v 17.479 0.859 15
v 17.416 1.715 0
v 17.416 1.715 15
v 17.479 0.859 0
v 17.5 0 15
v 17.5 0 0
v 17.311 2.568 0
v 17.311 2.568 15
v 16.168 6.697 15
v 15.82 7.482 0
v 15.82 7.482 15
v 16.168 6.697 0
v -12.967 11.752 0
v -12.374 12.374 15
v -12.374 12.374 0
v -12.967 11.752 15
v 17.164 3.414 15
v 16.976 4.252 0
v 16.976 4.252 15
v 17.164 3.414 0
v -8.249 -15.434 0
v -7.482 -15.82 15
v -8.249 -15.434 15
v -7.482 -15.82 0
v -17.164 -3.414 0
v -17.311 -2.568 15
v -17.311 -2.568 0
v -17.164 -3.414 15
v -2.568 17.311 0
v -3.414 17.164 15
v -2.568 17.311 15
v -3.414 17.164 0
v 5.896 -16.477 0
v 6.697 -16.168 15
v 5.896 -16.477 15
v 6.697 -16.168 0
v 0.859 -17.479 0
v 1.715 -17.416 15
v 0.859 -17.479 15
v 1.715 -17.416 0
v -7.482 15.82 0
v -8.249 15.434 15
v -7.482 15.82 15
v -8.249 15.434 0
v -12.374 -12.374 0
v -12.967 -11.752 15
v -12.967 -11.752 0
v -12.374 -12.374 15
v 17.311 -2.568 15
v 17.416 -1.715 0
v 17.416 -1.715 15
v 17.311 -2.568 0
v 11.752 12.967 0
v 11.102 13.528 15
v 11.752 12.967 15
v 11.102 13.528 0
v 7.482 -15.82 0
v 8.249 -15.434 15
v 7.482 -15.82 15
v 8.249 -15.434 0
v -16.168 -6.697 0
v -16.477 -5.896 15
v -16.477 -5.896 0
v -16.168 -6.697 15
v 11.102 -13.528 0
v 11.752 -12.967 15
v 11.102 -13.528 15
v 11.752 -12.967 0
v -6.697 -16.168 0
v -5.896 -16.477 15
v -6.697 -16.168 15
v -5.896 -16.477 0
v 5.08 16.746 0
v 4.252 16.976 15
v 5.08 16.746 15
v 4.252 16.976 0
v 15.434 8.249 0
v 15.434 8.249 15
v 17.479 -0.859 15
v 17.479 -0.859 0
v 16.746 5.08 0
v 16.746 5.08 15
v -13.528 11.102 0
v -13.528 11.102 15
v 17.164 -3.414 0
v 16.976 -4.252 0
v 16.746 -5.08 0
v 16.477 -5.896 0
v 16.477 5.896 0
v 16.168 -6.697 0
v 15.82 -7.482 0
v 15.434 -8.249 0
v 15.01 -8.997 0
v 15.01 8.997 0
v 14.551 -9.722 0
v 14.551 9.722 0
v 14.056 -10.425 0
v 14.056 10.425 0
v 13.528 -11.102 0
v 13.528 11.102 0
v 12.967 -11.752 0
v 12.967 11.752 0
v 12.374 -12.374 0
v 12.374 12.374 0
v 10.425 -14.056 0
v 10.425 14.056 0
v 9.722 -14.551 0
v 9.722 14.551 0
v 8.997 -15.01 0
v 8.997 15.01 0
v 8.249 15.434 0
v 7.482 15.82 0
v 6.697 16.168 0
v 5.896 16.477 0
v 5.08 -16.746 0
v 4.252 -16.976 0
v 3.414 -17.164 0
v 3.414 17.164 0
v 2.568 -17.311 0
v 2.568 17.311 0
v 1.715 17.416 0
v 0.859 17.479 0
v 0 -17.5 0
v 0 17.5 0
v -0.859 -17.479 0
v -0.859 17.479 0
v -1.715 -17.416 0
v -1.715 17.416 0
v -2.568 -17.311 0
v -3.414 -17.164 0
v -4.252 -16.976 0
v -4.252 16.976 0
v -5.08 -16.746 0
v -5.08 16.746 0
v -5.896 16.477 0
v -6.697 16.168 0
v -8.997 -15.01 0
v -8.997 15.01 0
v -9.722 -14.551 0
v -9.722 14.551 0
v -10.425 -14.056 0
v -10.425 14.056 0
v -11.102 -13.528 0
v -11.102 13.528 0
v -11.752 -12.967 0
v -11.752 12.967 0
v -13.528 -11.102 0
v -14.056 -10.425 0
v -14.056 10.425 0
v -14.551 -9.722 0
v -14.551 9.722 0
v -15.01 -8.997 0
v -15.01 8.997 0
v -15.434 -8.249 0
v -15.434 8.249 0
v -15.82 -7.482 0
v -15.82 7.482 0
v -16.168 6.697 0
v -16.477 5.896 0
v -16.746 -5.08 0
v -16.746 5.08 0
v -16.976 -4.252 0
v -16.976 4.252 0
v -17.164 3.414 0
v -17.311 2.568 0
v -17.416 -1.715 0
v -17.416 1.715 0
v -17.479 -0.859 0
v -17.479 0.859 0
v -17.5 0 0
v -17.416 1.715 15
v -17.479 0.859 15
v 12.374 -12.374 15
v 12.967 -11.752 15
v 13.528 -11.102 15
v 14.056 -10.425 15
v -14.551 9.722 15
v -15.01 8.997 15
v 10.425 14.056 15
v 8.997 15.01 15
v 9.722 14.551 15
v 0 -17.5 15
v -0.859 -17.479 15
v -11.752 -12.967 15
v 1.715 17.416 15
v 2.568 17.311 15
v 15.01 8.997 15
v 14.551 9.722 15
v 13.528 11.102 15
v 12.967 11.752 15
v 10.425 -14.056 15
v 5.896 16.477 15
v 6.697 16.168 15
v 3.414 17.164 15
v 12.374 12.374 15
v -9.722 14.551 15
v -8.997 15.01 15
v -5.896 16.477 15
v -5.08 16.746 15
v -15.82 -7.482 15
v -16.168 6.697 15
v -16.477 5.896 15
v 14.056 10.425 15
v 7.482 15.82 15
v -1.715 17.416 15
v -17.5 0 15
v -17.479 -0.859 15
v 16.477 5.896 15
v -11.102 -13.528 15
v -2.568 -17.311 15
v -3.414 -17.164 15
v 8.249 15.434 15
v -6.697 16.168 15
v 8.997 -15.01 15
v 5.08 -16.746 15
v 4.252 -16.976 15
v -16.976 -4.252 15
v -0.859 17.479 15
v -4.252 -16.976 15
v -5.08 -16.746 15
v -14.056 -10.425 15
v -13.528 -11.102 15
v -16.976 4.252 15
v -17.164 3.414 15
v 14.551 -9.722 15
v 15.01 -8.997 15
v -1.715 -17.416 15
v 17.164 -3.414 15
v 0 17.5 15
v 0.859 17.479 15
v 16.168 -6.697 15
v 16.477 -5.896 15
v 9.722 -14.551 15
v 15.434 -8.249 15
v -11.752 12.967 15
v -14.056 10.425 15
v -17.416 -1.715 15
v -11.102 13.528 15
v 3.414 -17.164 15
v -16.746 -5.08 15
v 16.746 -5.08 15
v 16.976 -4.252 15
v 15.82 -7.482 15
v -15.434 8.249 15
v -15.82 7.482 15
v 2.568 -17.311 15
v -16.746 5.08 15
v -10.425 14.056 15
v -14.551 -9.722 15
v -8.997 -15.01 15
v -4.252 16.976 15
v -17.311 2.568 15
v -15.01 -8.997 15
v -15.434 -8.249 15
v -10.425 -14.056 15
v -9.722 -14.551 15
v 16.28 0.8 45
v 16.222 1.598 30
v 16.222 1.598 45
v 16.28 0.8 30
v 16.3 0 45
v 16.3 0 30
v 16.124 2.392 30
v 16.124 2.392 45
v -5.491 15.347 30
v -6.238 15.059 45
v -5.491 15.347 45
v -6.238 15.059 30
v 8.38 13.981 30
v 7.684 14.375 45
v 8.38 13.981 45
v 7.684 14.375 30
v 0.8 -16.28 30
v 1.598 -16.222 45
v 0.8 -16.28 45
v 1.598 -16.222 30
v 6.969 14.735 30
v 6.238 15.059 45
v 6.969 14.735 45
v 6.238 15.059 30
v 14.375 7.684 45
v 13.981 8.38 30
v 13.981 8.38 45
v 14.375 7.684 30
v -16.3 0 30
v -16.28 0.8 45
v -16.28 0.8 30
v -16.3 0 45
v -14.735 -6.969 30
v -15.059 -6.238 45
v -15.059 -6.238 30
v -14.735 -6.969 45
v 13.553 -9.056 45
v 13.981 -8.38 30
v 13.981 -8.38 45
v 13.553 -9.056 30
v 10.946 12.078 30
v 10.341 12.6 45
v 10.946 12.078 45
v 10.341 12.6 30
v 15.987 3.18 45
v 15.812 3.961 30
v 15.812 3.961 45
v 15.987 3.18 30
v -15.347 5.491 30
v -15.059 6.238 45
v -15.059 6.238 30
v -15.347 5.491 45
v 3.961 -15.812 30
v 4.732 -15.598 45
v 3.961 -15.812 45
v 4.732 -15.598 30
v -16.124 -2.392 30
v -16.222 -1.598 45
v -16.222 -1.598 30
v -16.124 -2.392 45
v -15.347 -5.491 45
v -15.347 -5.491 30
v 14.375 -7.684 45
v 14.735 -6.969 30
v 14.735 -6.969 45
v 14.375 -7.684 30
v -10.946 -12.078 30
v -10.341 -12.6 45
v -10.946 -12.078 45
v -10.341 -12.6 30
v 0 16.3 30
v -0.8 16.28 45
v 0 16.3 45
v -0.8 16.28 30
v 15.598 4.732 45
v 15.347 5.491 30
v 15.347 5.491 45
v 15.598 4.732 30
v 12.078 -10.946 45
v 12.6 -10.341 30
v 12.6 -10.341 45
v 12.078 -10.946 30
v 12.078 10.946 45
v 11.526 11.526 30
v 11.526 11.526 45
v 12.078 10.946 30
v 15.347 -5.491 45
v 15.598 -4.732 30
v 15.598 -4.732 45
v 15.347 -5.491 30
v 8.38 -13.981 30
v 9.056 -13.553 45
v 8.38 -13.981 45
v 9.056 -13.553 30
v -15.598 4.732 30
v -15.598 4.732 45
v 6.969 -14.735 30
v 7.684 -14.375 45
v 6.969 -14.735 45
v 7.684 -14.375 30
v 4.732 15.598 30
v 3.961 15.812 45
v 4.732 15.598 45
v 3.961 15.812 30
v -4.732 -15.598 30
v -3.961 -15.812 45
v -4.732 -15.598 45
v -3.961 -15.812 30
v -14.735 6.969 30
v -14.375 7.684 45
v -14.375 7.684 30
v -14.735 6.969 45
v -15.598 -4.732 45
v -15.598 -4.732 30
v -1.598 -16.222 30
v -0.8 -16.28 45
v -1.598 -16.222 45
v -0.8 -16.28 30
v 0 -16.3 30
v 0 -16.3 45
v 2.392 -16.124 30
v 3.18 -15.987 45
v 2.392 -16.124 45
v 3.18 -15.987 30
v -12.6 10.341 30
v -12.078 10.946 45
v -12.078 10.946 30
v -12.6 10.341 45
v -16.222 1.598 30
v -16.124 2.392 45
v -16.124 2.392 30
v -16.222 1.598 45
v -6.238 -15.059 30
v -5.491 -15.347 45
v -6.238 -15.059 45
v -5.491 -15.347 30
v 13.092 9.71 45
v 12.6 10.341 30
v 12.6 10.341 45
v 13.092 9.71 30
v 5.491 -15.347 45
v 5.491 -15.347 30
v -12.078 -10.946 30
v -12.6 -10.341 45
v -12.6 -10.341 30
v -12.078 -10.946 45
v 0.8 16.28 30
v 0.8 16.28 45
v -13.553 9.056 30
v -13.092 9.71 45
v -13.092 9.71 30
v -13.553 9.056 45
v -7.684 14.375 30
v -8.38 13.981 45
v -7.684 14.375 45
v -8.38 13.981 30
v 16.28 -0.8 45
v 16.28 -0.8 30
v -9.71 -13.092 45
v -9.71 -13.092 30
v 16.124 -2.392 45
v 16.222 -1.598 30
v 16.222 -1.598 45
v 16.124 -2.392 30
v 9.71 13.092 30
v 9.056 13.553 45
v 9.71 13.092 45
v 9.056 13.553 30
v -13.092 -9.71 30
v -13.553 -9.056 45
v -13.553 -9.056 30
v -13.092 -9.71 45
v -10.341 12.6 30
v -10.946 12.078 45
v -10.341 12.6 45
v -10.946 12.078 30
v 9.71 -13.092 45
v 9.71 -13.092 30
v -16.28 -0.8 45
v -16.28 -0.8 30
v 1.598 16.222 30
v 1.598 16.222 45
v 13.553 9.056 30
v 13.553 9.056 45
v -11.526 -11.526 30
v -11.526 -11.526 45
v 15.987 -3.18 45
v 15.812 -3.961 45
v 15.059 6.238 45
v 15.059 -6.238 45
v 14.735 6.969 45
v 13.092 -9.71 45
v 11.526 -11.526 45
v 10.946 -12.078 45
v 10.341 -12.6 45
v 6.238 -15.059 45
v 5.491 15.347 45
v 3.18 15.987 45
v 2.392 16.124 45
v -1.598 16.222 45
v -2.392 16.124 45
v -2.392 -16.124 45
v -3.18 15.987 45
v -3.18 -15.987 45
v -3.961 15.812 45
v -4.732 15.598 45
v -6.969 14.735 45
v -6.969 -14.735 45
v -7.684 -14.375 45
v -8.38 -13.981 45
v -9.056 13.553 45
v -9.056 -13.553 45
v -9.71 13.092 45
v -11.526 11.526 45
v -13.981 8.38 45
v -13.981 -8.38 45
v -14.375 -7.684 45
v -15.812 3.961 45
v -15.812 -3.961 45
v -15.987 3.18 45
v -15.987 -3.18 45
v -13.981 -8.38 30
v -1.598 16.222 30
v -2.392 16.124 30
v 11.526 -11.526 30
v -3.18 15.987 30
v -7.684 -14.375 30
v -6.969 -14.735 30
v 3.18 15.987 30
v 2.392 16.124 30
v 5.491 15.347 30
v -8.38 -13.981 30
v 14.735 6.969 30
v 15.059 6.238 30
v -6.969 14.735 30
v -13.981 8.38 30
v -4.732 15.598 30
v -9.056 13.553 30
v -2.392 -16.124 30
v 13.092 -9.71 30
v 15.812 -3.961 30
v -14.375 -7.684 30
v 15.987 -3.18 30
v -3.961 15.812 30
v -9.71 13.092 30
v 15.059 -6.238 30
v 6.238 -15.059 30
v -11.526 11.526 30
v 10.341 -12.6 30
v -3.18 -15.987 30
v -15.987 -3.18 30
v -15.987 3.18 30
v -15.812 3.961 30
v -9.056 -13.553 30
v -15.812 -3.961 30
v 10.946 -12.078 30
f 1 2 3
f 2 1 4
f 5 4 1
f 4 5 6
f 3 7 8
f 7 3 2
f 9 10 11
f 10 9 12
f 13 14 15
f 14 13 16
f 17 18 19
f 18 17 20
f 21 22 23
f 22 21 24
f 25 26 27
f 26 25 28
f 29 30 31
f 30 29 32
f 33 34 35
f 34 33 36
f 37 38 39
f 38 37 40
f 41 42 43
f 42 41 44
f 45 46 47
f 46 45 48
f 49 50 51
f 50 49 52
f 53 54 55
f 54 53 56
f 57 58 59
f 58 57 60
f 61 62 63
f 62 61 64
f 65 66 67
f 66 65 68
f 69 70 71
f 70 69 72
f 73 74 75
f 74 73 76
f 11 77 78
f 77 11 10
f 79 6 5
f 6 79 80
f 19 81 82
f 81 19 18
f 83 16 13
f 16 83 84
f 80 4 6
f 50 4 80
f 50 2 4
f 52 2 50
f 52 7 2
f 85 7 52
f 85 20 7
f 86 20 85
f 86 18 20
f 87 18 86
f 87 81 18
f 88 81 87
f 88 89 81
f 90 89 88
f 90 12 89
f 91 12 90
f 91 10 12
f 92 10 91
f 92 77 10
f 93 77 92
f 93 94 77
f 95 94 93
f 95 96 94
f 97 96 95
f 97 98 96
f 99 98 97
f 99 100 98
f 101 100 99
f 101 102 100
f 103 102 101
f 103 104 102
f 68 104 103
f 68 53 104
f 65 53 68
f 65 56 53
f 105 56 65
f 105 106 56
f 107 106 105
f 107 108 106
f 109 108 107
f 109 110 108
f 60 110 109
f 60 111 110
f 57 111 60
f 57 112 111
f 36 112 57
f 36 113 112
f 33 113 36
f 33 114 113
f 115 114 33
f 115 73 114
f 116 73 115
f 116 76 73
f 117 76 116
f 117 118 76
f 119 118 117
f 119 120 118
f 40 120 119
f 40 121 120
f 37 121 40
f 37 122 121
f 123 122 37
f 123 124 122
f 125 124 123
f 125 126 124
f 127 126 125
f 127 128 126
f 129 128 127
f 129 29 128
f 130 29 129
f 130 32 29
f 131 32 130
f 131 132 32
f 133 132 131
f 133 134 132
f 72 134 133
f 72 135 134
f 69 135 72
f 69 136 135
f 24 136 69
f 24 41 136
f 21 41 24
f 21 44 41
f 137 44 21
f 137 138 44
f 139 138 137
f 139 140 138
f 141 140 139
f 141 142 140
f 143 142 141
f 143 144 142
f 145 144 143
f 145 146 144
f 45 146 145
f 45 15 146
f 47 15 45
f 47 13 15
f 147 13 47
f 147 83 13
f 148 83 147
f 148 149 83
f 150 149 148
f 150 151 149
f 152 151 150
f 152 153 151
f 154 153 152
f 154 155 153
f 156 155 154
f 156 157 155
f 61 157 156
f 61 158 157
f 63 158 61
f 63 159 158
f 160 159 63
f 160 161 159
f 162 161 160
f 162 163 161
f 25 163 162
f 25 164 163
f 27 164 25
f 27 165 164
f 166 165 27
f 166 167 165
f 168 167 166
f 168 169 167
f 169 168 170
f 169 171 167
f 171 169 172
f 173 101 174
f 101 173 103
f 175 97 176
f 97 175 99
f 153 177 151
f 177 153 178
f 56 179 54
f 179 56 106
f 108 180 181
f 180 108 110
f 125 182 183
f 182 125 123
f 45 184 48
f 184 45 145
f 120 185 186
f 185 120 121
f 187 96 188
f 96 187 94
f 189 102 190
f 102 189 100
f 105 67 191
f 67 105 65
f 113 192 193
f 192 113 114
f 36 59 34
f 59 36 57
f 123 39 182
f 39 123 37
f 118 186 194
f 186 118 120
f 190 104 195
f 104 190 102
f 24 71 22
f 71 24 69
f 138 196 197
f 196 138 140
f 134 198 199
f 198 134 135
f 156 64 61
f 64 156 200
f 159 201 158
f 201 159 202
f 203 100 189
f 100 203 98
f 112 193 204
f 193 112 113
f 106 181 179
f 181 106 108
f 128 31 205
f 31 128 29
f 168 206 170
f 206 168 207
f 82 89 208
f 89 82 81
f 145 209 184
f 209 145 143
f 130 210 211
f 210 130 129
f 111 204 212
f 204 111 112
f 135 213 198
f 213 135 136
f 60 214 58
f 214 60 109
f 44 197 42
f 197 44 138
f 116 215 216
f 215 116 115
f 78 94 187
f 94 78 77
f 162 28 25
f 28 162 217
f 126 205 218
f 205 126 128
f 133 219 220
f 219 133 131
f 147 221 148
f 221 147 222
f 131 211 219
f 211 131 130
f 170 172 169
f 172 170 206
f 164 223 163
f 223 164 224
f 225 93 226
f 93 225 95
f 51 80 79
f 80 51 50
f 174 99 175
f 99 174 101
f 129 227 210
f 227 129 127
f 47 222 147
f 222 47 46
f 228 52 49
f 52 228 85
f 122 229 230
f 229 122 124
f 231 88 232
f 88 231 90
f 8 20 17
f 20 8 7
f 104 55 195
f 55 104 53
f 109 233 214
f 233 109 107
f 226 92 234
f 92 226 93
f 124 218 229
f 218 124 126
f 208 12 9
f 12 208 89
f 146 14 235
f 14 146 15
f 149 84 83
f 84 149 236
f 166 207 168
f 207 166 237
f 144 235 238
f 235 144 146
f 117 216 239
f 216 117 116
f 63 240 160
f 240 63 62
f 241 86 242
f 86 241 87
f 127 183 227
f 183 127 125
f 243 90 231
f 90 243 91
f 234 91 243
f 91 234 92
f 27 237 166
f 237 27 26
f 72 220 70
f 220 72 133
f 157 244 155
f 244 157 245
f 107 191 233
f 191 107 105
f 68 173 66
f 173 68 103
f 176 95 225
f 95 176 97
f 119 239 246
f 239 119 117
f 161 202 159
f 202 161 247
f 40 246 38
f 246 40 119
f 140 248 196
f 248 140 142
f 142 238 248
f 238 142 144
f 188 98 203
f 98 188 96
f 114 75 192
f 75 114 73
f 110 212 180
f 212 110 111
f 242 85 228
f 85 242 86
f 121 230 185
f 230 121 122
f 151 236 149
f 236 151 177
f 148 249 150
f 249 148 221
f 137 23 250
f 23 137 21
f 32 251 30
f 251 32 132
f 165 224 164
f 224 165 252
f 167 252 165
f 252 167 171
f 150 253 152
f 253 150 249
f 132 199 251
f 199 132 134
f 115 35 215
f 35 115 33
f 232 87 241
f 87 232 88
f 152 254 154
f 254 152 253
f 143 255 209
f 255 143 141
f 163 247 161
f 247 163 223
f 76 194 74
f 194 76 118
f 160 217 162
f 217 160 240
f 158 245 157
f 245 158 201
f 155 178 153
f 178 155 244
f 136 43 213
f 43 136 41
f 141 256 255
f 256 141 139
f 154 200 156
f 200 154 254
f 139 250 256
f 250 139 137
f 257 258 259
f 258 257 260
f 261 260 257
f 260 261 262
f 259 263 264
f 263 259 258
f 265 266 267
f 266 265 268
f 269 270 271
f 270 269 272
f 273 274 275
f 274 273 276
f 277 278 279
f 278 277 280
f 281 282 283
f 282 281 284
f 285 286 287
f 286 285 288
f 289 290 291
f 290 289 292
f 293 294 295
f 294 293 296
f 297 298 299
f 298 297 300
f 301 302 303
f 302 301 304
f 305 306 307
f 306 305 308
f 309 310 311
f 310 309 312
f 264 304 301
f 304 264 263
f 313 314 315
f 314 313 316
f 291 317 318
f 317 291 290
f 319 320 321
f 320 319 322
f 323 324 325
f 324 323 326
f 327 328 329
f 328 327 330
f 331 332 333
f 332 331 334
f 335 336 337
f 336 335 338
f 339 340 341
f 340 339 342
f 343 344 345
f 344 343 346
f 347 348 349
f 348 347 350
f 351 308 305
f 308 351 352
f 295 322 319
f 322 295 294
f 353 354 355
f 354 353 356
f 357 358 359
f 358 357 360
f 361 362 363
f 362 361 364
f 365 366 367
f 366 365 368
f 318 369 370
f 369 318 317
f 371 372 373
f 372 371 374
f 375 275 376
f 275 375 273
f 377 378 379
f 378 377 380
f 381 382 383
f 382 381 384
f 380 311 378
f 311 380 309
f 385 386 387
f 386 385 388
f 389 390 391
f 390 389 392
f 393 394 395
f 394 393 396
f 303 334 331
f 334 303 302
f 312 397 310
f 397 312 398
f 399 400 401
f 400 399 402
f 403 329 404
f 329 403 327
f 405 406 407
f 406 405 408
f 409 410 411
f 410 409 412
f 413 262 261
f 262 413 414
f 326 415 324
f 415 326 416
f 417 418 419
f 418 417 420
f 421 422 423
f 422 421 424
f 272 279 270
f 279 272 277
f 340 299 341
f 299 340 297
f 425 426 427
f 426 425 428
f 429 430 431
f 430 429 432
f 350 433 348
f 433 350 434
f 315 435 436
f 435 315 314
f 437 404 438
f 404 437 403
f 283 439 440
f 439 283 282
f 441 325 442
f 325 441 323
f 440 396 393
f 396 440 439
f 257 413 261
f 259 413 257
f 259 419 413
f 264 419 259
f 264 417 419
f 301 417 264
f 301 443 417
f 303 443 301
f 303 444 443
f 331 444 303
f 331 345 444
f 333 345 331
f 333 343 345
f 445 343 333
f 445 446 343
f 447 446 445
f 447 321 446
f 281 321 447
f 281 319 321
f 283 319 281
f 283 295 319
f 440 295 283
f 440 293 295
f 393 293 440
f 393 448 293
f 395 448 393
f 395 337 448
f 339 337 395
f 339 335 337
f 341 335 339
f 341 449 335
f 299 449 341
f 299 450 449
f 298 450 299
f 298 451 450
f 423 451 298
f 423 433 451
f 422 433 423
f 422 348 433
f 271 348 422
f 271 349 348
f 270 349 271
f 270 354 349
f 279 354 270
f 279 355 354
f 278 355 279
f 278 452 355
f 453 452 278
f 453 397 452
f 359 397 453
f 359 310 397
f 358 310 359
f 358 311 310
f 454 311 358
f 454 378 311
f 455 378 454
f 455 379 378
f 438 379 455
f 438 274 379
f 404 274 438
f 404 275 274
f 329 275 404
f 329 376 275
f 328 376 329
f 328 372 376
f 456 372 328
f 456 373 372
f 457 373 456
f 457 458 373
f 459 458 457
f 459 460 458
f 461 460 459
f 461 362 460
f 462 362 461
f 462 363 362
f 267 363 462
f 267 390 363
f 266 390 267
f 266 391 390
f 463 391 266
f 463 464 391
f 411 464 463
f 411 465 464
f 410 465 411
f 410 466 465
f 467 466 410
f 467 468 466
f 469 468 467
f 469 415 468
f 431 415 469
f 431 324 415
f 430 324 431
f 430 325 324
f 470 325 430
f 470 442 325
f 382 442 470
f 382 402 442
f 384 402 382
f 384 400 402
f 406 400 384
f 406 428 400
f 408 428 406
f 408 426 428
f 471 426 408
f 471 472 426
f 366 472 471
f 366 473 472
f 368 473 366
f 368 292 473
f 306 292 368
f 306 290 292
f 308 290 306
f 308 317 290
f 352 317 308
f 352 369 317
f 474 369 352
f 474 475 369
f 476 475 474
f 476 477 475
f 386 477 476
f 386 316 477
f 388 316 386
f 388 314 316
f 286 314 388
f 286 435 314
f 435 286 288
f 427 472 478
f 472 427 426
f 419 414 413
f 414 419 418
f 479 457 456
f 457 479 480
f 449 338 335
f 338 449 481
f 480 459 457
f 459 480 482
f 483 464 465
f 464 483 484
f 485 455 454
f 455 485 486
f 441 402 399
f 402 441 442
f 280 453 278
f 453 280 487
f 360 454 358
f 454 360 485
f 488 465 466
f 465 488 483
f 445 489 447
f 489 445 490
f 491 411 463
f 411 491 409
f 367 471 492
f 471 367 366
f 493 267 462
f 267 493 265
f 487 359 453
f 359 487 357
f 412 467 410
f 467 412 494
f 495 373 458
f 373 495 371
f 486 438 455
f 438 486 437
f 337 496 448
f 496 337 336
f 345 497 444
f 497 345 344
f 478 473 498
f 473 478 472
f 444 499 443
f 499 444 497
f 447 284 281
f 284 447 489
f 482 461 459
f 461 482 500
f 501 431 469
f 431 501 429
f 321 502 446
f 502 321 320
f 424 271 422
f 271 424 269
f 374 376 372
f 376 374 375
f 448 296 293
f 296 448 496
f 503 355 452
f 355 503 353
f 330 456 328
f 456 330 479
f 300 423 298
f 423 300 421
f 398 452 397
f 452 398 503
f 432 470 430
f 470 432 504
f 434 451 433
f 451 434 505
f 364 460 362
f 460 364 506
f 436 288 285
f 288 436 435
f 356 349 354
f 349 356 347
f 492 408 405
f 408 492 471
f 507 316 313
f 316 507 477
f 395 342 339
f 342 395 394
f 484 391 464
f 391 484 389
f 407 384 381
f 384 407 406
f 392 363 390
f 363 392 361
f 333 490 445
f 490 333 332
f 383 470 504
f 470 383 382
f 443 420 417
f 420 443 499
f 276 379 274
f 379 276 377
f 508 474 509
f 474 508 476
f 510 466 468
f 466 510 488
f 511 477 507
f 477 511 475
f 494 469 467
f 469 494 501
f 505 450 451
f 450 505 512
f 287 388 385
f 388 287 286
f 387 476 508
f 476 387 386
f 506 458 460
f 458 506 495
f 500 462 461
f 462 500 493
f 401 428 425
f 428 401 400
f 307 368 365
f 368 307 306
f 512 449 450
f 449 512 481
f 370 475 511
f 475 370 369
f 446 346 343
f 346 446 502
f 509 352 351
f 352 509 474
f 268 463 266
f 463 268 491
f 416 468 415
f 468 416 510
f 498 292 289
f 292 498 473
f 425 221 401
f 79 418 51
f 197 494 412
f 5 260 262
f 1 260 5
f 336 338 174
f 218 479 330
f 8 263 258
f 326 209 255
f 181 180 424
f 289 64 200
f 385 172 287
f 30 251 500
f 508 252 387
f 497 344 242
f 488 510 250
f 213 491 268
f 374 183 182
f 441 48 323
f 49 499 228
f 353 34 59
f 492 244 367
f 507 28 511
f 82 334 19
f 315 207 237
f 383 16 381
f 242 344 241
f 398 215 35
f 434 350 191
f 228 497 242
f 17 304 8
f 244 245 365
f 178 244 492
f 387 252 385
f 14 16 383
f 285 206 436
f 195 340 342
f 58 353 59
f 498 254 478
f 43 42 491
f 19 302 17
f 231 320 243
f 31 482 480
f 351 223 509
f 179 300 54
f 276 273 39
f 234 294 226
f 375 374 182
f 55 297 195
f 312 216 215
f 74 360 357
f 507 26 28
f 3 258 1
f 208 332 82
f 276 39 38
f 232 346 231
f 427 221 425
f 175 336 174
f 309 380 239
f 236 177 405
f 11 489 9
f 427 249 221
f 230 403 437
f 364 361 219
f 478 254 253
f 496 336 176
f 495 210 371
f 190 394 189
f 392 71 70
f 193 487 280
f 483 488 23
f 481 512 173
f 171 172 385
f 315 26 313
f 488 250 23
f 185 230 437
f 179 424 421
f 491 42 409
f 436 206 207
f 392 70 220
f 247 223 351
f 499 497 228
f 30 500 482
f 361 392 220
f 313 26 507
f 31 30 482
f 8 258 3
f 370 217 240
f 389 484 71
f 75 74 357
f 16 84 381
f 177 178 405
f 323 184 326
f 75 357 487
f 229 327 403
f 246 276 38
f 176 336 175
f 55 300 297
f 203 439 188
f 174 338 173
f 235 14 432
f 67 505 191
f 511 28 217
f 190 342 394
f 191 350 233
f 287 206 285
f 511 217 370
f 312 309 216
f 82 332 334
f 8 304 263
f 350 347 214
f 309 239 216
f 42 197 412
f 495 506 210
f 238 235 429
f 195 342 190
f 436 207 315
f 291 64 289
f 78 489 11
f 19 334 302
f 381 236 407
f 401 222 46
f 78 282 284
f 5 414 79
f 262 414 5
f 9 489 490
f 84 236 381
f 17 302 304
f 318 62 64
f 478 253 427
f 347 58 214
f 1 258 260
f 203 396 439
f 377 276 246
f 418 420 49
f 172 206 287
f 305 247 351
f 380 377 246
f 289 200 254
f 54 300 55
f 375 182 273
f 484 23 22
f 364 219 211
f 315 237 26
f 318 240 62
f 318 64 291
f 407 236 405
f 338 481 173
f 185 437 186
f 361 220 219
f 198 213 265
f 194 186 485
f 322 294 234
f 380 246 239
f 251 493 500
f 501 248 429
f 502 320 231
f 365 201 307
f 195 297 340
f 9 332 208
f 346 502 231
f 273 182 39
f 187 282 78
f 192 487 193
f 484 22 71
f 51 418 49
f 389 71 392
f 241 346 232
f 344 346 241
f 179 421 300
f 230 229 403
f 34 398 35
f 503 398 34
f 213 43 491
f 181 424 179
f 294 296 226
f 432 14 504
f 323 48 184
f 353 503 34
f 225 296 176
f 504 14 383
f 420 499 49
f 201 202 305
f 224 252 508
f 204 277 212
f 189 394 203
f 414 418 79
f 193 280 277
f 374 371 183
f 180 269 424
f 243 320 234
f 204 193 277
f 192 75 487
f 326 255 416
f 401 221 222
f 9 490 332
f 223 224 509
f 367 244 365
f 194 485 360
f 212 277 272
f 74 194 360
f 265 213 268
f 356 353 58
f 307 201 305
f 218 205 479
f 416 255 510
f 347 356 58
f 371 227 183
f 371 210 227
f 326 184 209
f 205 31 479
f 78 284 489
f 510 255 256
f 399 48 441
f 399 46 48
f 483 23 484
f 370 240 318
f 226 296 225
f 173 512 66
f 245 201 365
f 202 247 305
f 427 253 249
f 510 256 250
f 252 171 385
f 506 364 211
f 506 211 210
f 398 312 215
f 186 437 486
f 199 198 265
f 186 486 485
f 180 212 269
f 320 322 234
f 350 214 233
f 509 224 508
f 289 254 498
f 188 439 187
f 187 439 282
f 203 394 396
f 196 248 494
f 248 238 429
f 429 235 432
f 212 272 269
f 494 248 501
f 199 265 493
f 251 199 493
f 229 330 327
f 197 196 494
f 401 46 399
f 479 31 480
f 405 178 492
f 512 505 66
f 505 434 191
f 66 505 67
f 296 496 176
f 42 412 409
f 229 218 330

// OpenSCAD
$fn=128;
d1=35;
d2=32.6;
h=15;
cylinder(d=d1,h=h);
translate([0,0,2*h])cylinder(d=d2,h=h);
translate([0,0,h])cylinder(d1=d1,d2=d2,h=h);
